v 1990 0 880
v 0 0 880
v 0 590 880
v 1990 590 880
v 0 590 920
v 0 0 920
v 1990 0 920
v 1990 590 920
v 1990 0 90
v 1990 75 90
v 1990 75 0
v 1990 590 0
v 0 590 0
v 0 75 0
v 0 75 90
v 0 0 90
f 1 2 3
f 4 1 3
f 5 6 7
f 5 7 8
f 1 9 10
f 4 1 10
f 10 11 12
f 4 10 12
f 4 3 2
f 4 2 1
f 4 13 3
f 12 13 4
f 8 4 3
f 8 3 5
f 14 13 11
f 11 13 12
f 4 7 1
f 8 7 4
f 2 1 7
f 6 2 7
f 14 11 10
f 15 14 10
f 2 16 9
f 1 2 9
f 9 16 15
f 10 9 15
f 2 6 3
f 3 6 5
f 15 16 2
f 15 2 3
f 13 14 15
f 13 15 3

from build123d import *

# Parameters (mm, degrees)
F0_W     = 1990
F0_H     = 590
F1_DEPTH = 880
F2_W     = 75
F2_H     = 90
F3_DEPTH = 1990.001
F4_W     = 590
F4_H     = 40
F5_DEPTH = 1990


with BuildPart() as f1:
    # F0 (on Top) → F1 (new body)
    with BuildSketch(Plane.XY):
        with Locations((995, 295)):
            Rectangle(F0_W, F0_H)
    extrude(amount=F1_DEPTH)

    # F2 (on Right) → F3 (cut, through all)
    with BuildSketch(Plane.YZ):
        with Locations((37.5, 45)):
            Rectangle(F2_W, F2_H)
    extrude(amount=F3_DEPTH, mode=Mode.SUBTRACT)


with BuildPart() as f5:
    # F4 (on Right) → F5 (new body, through all)
    with BuildSketch(Plane.YZ):
        with Locations((295, 900)):
            Rectangle(F4_W, F4_H)
    extrude(amount=F5_DEPTH)


solid = Compound([f1.part, f5.part])
